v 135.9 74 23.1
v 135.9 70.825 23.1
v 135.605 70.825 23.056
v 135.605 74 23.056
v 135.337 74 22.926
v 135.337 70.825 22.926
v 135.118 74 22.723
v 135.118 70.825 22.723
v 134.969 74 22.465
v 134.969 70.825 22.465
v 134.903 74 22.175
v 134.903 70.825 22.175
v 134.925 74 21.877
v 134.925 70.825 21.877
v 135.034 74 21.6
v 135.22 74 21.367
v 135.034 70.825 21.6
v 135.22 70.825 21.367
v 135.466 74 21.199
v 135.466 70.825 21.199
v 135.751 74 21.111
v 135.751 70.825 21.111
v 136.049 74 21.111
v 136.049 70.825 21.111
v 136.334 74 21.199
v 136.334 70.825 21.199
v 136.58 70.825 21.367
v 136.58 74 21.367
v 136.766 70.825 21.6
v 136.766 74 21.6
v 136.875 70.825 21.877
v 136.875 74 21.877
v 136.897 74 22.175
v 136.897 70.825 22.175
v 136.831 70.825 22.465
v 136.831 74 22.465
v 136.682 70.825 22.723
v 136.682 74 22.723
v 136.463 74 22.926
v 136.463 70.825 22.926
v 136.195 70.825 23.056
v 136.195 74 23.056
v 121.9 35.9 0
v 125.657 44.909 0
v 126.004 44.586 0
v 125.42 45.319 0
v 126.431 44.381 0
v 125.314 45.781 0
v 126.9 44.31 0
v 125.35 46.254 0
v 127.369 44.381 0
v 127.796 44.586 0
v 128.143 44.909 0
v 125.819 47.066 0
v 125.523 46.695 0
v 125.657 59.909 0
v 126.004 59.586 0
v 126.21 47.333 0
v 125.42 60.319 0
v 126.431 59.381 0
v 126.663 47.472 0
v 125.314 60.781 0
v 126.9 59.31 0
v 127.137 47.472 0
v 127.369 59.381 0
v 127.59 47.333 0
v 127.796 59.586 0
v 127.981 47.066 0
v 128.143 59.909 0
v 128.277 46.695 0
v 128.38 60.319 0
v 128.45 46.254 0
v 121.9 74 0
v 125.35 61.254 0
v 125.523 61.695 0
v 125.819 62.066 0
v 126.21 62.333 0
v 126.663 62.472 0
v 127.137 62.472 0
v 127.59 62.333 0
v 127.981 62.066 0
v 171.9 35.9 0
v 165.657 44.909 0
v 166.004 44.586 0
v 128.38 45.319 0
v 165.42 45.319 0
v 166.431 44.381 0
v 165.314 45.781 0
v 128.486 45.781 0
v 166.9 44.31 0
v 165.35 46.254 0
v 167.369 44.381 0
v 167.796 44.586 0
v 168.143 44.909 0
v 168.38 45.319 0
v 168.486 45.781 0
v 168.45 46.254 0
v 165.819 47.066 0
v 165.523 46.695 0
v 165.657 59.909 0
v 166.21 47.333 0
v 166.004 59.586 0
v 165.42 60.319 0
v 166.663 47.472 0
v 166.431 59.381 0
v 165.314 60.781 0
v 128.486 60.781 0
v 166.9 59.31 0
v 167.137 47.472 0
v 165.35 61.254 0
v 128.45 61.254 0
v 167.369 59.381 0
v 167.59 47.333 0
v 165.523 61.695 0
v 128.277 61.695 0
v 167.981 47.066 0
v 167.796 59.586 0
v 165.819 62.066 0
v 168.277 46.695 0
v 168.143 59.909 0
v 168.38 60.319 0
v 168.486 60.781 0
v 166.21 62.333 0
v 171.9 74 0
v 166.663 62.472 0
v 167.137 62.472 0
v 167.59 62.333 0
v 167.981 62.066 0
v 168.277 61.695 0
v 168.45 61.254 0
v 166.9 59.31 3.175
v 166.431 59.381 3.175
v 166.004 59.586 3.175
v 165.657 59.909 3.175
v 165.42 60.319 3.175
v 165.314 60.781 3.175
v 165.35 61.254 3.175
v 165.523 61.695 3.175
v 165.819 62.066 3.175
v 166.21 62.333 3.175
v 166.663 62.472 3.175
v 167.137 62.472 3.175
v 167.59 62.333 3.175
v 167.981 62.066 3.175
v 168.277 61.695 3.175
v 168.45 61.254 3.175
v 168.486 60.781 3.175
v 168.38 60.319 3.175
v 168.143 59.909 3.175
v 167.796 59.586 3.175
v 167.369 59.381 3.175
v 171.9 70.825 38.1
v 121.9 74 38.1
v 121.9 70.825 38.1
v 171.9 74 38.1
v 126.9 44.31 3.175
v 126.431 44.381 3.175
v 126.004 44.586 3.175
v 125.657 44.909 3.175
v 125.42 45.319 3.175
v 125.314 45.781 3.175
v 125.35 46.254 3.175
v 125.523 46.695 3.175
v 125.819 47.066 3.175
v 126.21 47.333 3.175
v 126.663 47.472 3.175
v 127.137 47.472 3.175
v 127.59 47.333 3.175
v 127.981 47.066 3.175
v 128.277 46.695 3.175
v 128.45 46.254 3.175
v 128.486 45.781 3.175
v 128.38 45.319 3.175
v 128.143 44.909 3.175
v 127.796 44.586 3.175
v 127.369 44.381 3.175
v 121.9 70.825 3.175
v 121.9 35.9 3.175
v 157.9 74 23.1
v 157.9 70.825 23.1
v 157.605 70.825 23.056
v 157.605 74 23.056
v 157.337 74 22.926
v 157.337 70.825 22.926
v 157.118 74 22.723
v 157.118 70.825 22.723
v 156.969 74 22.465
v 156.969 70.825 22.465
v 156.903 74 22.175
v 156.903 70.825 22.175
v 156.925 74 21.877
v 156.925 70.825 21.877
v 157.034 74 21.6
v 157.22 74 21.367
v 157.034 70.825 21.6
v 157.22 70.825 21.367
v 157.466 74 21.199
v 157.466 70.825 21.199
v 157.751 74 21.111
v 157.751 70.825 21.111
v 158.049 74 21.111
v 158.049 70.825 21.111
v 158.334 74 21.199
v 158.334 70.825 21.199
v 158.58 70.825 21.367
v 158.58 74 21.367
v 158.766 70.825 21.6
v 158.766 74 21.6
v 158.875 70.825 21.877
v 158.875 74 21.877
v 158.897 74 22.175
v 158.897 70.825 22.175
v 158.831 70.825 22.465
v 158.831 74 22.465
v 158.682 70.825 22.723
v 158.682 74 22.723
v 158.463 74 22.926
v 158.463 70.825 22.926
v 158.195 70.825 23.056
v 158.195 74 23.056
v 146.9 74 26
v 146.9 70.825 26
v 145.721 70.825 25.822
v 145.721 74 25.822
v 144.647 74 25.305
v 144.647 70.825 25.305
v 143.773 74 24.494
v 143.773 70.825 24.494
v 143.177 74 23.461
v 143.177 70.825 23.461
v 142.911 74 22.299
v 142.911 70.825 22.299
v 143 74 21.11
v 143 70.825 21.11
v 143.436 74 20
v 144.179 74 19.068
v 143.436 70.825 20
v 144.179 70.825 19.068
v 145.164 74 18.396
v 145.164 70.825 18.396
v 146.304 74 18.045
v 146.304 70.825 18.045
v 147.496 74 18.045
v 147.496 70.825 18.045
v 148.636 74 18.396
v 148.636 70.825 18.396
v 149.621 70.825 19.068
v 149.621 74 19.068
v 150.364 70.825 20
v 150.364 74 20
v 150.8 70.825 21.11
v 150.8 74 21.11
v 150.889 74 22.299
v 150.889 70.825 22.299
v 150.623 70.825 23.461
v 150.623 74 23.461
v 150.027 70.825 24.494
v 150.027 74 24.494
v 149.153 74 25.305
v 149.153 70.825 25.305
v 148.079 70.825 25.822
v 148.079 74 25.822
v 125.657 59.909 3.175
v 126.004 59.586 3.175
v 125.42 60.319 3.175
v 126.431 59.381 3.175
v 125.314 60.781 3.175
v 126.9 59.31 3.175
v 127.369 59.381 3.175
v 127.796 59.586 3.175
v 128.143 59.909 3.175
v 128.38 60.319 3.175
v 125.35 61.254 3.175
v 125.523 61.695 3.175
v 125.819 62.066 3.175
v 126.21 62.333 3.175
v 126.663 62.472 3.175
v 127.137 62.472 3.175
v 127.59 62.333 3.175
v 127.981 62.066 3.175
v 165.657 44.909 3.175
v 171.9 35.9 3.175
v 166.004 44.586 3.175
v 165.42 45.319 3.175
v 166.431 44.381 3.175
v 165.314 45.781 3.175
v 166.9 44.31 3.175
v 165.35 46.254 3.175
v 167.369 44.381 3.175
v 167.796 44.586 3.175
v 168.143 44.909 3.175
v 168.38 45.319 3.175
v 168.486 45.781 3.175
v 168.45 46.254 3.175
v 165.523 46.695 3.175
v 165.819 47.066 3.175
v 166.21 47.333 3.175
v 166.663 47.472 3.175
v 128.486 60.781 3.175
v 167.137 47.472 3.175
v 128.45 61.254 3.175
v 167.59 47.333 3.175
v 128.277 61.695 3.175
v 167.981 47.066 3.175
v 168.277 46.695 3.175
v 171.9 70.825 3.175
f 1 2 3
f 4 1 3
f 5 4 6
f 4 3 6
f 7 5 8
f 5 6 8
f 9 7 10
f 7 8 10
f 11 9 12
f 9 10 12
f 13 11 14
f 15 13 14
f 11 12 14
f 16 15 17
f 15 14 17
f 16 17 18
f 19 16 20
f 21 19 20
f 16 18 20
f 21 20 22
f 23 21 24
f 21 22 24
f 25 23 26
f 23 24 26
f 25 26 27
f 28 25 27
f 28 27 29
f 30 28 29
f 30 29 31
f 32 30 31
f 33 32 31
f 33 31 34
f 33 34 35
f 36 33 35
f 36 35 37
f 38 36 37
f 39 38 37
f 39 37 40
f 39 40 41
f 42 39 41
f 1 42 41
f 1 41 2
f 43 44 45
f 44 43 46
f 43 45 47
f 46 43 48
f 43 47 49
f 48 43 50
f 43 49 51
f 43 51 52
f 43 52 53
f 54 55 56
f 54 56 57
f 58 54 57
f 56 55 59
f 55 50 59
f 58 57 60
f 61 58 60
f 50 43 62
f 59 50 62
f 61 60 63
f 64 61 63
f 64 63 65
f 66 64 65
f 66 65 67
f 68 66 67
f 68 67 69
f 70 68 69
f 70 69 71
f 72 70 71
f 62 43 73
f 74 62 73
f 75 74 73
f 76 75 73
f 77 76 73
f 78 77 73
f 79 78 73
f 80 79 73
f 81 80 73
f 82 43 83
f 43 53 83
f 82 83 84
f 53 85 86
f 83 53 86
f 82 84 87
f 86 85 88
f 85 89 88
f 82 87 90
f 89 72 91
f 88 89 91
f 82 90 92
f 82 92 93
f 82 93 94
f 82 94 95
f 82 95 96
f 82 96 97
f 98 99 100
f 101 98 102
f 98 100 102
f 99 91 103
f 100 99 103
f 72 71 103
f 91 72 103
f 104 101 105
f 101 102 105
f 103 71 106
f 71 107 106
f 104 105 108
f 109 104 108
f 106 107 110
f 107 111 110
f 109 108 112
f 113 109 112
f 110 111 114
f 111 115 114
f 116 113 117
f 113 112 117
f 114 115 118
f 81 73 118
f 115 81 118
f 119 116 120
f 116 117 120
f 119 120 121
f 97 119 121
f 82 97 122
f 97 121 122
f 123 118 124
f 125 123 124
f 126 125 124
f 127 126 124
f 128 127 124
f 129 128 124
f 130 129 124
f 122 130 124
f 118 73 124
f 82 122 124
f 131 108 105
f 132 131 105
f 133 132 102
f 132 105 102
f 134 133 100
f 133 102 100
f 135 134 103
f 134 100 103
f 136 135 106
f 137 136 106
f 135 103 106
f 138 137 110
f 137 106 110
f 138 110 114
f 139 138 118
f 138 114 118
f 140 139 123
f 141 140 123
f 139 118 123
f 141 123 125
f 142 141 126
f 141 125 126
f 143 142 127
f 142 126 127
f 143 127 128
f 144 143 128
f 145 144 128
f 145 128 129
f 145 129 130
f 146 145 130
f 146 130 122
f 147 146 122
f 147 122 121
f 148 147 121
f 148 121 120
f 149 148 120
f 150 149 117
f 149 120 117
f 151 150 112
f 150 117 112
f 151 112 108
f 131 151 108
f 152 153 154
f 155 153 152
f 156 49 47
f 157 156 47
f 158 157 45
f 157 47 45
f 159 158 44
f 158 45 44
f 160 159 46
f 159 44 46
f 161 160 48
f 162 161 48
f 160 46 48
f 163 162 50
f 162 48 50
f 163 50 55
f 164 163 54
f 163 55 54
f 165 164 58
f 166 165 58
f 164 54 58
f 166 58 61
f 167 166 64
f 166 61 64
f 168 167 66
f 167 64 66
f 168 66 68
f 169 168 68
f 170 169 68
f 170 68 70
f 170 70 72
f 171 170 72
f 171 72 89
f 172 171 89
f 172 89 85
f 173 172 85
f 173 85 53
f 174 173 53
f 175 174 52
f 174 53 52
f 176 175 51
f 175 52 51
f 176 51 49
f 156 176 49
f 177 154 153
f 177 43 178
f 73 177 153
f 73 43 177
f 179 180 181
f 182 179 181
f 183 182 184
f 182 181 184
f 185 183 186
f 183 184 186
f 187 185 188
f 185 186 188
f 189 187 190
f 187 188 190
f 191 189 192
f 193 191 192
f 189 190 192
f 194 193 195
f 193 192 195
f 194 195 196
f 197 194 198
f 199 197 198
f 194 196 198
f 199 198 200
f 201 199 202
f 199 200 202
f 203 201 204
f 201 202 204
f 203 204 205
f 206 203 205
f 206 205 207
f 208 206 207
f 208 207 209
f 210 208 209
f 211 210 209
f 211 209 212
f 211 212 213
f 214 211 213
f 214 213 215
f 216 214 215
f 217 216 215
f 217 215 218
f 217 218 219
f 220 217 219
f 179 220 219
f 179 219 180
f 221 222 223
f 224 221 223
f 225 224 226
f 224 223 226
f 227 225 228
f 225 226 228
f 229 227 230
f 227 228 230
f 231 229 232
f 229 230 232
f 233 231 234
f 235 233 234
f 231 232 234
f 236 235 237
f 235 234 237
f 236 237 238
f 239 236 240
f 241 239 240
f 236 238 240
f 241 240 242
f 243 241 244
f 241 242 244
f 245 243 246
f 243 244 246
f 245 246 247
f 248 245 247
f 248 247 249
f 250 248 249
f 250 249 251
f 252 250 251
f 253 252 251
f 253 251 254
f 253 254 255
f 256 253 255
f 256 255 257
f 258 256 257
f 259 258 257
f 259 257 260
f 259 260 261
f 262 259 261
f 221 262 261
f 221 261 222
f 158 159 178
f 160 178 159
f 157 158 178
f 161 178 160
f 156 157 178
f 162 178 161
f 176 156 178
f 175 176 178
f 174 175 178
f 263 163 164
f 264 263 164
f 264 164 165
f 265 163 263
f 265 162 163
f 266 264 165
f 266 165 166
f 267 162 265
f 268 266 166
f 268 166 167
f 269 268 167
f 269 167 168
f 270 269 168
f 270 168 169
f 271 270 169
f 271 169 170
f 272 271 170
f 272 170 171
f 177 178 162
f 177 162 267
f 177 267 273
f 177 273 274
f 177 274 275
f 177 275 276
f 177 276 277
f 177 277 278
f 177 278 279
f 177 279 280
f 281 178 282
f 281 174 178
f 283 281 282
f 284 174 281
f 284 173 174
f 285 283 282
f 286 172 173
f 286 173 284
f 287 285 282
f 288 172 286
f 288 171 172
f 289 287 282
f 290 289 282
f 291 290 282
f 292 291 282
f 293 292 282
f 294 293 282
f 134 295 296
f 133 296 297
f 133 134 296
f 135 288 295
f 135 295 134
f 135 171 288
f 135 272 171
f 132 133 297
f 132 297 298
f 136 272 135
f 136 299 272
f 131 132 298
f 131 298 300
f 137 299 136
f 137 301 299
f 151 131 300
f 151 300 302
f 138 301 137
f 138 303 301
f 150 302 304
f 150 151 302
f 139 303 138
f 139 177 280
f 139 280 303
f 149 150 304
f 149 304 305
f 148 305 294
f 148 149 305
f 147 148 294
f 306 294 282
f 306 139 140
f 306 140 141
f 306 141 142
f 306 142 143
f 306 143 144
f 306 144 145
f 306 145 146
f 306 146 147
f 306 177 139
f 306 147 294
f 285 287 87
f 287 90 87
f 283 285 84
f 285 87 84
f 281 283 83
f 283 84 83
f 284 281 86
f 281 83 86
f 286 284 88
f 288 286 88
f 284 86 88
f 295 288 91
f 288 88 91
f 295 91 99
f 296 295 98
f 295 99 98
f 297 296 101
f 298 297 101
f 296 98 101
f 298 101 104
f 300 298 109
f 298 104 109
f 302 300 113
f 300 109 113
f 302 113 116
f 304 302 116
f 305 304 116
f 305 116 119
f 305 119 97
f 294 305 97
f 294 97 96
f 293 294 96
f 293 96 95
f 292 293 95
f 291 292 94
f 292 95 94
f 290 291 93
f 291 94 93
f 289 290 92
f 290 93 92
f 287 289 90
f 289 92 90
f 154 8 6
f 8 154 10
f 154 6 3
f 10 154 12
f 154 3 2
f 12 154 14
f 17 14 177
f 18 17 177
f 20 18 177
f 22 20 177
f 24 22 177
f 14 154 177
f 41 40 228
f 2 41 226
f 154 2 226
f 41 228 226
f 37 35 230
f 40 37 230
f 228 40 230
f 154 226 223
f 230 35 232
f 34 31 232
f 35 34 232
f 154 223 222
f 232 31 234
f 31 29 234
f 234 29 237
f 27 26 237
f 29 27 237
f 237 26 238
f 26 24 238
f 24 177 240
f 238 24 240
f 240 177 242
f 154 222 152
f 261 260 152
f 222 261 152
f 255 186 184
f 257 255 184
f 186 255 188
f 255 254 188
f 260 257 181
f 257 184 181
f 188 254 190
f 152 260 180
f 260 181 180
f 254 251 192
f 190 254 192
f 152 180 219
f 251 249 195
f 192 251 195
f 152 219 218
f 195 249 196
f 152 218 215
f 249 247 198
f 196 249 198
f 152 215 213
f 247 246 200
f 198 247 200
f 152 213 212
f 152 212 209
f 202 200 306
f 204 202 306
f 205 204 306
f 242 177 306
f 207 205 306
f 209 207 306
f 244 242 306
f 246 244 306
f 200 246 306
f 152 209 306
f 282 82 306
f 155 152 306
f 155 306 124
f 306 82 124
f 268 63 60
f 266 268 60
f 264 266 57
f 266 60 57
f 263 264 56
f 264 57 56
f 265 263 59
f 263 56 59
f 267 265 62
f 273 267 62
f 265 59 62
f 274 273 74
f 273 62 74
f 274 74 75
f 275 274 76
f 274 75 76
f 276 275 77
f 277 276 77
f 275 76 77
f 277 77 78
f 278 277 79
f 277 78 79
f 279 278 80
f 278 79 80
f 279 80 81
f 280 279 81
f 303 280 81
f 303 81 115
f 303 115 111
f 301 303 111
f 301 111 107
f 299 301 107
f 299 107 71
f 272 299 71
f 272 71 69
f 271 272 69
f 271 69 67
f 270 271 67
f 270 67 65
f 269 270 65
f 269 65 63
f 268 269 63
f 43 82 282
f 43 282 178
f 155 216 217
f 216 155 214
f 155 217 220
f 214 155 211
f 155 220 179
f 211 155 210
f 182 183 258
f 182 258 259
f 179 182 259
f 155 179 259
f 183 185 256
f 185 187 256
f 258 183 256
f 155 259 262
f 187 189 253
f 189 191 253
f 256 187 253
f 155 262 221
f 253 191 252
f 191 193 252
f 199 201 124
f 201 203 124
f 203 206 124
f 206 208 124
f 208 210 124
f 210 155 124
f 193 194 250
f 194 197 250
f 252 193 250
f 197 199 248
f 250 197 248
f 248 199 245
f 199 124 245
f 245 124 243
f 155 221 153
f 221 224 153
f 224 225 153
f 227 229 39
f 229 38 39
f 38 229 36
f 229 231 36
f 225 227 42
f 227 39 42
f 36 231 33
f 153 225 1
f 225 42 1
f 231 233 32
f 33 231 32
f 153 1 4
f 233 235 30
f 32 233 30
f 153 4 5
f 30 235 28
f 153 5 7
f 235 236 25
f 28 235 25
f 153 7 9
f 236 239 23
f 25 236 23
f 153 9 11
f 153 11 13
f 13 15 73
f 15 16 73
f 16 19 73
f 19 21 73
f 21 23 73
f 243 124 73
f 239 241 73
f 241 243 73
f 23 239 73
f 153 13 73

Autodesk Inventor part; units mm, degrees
ref_plane "YZ Plane" through (0, 0, 0) normal (1, 0, 0) x (0, 1, 0)
ref_plane "XZ Plane" through (0, 0, 0) normal (0, 1, 0) x (-1, 0, 0)
ref_plane "XY Plane" through (0, 0, 0) normal (0, 0, 1) x (1, 0, 0)
sketch "Sketch1" plane through (0, 0, 0) normal (0, 0, 1) x (1, 0, 0)
  line L0 (-200, 100) -> (200, 100) projected
  line L1 (-200, -100) -> (-200, 100) projected
  line L2 (200, -100) -> (-200, -100) projected
  line L3 (121.9, 74) -> (121.9, 71)
  line L4 (171.9, 74) -> (121.9, 74)
  line L5 (171.9, 71) -> (171.9, 35.9)
  line L6 (121.9, 71) -> (171.9, 71)
  line L7 (121.9, 71) -> (121.9, 35.9)
  line L8 (171.9, 35.9) -> (121.9, 35.9)
  line L9 (171.9, 71) -> (171.9, 35.9)
  line L10 (171.9, 74) -> (171.9, 71)
  line L11 (121.9, 35.9) -> (171.9, 35.9)
  line L12 (171.9, 35.9) -> (171.9, 71)
  line L13 (171.9, 71) -> (121.9, 71)
  line L14 (121.9, 71) -> (121.9, 35.9)
  point P0 (0, 0)
extrude "Extrusion1" add sketch "Sketch1" along normal blind 3.175
sketch "Sketch2" plane through (0, 0, 3.175) normal (0, 0, 1) x (1, 0, 0)
  line L0 (171.9, 74) -> (121.9, 74) projected
  line L1 (171.9, 35.9) -> (171.9, 74) projected
  line L2 (121.9, 74) -> (171.9, 74)
  line L3 (171.9, 74) -> (171.9, 71)
  line L4 (121.9, 71) -> (121.9, 74)
  line L5 (121.9, 71) -> (121.9, 70.825)
  line L6 (121.9, 74) -> (121.9, 35.9) projected
  line L7 (121.9, 70.825) -> (171.9, 70.825)
  line L8 (171.9, 71) -> (171.9, 70.825)
  line L9 (171.9, 71) -> (171.9, 70.825)
  point P0 (0, 0)
  dimension "d3" = 3
  dimension "d54" = 0.175
extrude "Extrusion2" add sketch "Sketch2" along normal blind 34.925
sketch "Sketch3" plane through (121.9, 74, 0) normal (0, 1, 0) x (1, 0, 0)
  line L0 (50, 0) -> (0, 0) projected
  line L1 (0, 0) -> (0, -38.1) projected
  line L2 (50, -38.1) -> (0, -38.1) projected
  line L3 (50, 0) -> (50, -38.1) projected
  line L4 (50, -3.175) -> (50, -38.1) projected
  line L5 (0, -38.1) -> (0, -19.225)
  line L6 (50, -19.05) -> (60.9839, -19.05)
  line L7 (0, -38.1) -> (0, -22.1)
  line L8 (0, -22.1) -> (14, -22.1)
  line L9 (36, -22.1) -> (36, -22)
  point P0 (-121.9, 0)
  point P1 (14, -22)
  dimension "d55" = 16
sketch "Sketch4" plane through (121.9, 74, 0) normal (0, 1, 0) x (1, 0, 0)
  line L0 (50, 0) -> (0, 0) projected
  line L1 (0, 0) -> (0, -38.1) projected
  line L2 (50, -38.1) -> (0, -38.1) projected
  line L3 (50, 0) -> (50, -38.1) projected
  line L4 (0, -38.1) -> (0, -22.1)
  line L5 (25, -22) -> (25, -22)
  point P0 (-121.9, 0)
  dimension "d56" = 16
hole "Hole2" at (146.9, 74, 22) direction (0, -1, 0) diameter 8 end through all
hole "Hole3" at (135.9, 74, 22.1) at (157.9, 74, 22.1) direction (0, -1, 0) diameter 2 end through all
sketch "Sketch5" plane through (0, 0, 3.175) normal (0, 0, 1) x (1, 0, 0)
  line L0 (121.9, 70.825) -> (121.9, 35.9) projected
  line L1 (121.9, 35.9) -> (171.9, 35.9) projected
  line L2 (171.9, 35.9) -> (171.9, 70.825) projected
  line L3 (171.9, 70.825) -> (121.9, 70.825) projected
  line L4 (121.9, 35.9) -> (171.9, 35.9) projected
  line L5 (171.9, 35.9) -> (167.9, 35.9)
  line L6 (171.9, 35.9) -> (166.9, 35.9)
  circle A0 centre (166.9, 45.9) radius 1.5
  circle A1 centre (166.9, 60.9) radius 1.5
  circle A2 centre (126.9, 60.9) radius 1.5
  circle A3 centre (126.9, 45.9) radius 1.5
  line L7 (121.9, 35.9) -> (121.9, 45.9)
  point P0 (0, 0)
  dimension "d70" = 5
hole "Hole5" at (166.9, 45.9, 3.175) at (166.9, 60.9, 3.175) at (126.9, 60.9, 3.175) at (126.9, 45.9, 3.175) direction (0, 0, -1) diameter 3.18 end through all
properties part number "Suporte motor sensor"
